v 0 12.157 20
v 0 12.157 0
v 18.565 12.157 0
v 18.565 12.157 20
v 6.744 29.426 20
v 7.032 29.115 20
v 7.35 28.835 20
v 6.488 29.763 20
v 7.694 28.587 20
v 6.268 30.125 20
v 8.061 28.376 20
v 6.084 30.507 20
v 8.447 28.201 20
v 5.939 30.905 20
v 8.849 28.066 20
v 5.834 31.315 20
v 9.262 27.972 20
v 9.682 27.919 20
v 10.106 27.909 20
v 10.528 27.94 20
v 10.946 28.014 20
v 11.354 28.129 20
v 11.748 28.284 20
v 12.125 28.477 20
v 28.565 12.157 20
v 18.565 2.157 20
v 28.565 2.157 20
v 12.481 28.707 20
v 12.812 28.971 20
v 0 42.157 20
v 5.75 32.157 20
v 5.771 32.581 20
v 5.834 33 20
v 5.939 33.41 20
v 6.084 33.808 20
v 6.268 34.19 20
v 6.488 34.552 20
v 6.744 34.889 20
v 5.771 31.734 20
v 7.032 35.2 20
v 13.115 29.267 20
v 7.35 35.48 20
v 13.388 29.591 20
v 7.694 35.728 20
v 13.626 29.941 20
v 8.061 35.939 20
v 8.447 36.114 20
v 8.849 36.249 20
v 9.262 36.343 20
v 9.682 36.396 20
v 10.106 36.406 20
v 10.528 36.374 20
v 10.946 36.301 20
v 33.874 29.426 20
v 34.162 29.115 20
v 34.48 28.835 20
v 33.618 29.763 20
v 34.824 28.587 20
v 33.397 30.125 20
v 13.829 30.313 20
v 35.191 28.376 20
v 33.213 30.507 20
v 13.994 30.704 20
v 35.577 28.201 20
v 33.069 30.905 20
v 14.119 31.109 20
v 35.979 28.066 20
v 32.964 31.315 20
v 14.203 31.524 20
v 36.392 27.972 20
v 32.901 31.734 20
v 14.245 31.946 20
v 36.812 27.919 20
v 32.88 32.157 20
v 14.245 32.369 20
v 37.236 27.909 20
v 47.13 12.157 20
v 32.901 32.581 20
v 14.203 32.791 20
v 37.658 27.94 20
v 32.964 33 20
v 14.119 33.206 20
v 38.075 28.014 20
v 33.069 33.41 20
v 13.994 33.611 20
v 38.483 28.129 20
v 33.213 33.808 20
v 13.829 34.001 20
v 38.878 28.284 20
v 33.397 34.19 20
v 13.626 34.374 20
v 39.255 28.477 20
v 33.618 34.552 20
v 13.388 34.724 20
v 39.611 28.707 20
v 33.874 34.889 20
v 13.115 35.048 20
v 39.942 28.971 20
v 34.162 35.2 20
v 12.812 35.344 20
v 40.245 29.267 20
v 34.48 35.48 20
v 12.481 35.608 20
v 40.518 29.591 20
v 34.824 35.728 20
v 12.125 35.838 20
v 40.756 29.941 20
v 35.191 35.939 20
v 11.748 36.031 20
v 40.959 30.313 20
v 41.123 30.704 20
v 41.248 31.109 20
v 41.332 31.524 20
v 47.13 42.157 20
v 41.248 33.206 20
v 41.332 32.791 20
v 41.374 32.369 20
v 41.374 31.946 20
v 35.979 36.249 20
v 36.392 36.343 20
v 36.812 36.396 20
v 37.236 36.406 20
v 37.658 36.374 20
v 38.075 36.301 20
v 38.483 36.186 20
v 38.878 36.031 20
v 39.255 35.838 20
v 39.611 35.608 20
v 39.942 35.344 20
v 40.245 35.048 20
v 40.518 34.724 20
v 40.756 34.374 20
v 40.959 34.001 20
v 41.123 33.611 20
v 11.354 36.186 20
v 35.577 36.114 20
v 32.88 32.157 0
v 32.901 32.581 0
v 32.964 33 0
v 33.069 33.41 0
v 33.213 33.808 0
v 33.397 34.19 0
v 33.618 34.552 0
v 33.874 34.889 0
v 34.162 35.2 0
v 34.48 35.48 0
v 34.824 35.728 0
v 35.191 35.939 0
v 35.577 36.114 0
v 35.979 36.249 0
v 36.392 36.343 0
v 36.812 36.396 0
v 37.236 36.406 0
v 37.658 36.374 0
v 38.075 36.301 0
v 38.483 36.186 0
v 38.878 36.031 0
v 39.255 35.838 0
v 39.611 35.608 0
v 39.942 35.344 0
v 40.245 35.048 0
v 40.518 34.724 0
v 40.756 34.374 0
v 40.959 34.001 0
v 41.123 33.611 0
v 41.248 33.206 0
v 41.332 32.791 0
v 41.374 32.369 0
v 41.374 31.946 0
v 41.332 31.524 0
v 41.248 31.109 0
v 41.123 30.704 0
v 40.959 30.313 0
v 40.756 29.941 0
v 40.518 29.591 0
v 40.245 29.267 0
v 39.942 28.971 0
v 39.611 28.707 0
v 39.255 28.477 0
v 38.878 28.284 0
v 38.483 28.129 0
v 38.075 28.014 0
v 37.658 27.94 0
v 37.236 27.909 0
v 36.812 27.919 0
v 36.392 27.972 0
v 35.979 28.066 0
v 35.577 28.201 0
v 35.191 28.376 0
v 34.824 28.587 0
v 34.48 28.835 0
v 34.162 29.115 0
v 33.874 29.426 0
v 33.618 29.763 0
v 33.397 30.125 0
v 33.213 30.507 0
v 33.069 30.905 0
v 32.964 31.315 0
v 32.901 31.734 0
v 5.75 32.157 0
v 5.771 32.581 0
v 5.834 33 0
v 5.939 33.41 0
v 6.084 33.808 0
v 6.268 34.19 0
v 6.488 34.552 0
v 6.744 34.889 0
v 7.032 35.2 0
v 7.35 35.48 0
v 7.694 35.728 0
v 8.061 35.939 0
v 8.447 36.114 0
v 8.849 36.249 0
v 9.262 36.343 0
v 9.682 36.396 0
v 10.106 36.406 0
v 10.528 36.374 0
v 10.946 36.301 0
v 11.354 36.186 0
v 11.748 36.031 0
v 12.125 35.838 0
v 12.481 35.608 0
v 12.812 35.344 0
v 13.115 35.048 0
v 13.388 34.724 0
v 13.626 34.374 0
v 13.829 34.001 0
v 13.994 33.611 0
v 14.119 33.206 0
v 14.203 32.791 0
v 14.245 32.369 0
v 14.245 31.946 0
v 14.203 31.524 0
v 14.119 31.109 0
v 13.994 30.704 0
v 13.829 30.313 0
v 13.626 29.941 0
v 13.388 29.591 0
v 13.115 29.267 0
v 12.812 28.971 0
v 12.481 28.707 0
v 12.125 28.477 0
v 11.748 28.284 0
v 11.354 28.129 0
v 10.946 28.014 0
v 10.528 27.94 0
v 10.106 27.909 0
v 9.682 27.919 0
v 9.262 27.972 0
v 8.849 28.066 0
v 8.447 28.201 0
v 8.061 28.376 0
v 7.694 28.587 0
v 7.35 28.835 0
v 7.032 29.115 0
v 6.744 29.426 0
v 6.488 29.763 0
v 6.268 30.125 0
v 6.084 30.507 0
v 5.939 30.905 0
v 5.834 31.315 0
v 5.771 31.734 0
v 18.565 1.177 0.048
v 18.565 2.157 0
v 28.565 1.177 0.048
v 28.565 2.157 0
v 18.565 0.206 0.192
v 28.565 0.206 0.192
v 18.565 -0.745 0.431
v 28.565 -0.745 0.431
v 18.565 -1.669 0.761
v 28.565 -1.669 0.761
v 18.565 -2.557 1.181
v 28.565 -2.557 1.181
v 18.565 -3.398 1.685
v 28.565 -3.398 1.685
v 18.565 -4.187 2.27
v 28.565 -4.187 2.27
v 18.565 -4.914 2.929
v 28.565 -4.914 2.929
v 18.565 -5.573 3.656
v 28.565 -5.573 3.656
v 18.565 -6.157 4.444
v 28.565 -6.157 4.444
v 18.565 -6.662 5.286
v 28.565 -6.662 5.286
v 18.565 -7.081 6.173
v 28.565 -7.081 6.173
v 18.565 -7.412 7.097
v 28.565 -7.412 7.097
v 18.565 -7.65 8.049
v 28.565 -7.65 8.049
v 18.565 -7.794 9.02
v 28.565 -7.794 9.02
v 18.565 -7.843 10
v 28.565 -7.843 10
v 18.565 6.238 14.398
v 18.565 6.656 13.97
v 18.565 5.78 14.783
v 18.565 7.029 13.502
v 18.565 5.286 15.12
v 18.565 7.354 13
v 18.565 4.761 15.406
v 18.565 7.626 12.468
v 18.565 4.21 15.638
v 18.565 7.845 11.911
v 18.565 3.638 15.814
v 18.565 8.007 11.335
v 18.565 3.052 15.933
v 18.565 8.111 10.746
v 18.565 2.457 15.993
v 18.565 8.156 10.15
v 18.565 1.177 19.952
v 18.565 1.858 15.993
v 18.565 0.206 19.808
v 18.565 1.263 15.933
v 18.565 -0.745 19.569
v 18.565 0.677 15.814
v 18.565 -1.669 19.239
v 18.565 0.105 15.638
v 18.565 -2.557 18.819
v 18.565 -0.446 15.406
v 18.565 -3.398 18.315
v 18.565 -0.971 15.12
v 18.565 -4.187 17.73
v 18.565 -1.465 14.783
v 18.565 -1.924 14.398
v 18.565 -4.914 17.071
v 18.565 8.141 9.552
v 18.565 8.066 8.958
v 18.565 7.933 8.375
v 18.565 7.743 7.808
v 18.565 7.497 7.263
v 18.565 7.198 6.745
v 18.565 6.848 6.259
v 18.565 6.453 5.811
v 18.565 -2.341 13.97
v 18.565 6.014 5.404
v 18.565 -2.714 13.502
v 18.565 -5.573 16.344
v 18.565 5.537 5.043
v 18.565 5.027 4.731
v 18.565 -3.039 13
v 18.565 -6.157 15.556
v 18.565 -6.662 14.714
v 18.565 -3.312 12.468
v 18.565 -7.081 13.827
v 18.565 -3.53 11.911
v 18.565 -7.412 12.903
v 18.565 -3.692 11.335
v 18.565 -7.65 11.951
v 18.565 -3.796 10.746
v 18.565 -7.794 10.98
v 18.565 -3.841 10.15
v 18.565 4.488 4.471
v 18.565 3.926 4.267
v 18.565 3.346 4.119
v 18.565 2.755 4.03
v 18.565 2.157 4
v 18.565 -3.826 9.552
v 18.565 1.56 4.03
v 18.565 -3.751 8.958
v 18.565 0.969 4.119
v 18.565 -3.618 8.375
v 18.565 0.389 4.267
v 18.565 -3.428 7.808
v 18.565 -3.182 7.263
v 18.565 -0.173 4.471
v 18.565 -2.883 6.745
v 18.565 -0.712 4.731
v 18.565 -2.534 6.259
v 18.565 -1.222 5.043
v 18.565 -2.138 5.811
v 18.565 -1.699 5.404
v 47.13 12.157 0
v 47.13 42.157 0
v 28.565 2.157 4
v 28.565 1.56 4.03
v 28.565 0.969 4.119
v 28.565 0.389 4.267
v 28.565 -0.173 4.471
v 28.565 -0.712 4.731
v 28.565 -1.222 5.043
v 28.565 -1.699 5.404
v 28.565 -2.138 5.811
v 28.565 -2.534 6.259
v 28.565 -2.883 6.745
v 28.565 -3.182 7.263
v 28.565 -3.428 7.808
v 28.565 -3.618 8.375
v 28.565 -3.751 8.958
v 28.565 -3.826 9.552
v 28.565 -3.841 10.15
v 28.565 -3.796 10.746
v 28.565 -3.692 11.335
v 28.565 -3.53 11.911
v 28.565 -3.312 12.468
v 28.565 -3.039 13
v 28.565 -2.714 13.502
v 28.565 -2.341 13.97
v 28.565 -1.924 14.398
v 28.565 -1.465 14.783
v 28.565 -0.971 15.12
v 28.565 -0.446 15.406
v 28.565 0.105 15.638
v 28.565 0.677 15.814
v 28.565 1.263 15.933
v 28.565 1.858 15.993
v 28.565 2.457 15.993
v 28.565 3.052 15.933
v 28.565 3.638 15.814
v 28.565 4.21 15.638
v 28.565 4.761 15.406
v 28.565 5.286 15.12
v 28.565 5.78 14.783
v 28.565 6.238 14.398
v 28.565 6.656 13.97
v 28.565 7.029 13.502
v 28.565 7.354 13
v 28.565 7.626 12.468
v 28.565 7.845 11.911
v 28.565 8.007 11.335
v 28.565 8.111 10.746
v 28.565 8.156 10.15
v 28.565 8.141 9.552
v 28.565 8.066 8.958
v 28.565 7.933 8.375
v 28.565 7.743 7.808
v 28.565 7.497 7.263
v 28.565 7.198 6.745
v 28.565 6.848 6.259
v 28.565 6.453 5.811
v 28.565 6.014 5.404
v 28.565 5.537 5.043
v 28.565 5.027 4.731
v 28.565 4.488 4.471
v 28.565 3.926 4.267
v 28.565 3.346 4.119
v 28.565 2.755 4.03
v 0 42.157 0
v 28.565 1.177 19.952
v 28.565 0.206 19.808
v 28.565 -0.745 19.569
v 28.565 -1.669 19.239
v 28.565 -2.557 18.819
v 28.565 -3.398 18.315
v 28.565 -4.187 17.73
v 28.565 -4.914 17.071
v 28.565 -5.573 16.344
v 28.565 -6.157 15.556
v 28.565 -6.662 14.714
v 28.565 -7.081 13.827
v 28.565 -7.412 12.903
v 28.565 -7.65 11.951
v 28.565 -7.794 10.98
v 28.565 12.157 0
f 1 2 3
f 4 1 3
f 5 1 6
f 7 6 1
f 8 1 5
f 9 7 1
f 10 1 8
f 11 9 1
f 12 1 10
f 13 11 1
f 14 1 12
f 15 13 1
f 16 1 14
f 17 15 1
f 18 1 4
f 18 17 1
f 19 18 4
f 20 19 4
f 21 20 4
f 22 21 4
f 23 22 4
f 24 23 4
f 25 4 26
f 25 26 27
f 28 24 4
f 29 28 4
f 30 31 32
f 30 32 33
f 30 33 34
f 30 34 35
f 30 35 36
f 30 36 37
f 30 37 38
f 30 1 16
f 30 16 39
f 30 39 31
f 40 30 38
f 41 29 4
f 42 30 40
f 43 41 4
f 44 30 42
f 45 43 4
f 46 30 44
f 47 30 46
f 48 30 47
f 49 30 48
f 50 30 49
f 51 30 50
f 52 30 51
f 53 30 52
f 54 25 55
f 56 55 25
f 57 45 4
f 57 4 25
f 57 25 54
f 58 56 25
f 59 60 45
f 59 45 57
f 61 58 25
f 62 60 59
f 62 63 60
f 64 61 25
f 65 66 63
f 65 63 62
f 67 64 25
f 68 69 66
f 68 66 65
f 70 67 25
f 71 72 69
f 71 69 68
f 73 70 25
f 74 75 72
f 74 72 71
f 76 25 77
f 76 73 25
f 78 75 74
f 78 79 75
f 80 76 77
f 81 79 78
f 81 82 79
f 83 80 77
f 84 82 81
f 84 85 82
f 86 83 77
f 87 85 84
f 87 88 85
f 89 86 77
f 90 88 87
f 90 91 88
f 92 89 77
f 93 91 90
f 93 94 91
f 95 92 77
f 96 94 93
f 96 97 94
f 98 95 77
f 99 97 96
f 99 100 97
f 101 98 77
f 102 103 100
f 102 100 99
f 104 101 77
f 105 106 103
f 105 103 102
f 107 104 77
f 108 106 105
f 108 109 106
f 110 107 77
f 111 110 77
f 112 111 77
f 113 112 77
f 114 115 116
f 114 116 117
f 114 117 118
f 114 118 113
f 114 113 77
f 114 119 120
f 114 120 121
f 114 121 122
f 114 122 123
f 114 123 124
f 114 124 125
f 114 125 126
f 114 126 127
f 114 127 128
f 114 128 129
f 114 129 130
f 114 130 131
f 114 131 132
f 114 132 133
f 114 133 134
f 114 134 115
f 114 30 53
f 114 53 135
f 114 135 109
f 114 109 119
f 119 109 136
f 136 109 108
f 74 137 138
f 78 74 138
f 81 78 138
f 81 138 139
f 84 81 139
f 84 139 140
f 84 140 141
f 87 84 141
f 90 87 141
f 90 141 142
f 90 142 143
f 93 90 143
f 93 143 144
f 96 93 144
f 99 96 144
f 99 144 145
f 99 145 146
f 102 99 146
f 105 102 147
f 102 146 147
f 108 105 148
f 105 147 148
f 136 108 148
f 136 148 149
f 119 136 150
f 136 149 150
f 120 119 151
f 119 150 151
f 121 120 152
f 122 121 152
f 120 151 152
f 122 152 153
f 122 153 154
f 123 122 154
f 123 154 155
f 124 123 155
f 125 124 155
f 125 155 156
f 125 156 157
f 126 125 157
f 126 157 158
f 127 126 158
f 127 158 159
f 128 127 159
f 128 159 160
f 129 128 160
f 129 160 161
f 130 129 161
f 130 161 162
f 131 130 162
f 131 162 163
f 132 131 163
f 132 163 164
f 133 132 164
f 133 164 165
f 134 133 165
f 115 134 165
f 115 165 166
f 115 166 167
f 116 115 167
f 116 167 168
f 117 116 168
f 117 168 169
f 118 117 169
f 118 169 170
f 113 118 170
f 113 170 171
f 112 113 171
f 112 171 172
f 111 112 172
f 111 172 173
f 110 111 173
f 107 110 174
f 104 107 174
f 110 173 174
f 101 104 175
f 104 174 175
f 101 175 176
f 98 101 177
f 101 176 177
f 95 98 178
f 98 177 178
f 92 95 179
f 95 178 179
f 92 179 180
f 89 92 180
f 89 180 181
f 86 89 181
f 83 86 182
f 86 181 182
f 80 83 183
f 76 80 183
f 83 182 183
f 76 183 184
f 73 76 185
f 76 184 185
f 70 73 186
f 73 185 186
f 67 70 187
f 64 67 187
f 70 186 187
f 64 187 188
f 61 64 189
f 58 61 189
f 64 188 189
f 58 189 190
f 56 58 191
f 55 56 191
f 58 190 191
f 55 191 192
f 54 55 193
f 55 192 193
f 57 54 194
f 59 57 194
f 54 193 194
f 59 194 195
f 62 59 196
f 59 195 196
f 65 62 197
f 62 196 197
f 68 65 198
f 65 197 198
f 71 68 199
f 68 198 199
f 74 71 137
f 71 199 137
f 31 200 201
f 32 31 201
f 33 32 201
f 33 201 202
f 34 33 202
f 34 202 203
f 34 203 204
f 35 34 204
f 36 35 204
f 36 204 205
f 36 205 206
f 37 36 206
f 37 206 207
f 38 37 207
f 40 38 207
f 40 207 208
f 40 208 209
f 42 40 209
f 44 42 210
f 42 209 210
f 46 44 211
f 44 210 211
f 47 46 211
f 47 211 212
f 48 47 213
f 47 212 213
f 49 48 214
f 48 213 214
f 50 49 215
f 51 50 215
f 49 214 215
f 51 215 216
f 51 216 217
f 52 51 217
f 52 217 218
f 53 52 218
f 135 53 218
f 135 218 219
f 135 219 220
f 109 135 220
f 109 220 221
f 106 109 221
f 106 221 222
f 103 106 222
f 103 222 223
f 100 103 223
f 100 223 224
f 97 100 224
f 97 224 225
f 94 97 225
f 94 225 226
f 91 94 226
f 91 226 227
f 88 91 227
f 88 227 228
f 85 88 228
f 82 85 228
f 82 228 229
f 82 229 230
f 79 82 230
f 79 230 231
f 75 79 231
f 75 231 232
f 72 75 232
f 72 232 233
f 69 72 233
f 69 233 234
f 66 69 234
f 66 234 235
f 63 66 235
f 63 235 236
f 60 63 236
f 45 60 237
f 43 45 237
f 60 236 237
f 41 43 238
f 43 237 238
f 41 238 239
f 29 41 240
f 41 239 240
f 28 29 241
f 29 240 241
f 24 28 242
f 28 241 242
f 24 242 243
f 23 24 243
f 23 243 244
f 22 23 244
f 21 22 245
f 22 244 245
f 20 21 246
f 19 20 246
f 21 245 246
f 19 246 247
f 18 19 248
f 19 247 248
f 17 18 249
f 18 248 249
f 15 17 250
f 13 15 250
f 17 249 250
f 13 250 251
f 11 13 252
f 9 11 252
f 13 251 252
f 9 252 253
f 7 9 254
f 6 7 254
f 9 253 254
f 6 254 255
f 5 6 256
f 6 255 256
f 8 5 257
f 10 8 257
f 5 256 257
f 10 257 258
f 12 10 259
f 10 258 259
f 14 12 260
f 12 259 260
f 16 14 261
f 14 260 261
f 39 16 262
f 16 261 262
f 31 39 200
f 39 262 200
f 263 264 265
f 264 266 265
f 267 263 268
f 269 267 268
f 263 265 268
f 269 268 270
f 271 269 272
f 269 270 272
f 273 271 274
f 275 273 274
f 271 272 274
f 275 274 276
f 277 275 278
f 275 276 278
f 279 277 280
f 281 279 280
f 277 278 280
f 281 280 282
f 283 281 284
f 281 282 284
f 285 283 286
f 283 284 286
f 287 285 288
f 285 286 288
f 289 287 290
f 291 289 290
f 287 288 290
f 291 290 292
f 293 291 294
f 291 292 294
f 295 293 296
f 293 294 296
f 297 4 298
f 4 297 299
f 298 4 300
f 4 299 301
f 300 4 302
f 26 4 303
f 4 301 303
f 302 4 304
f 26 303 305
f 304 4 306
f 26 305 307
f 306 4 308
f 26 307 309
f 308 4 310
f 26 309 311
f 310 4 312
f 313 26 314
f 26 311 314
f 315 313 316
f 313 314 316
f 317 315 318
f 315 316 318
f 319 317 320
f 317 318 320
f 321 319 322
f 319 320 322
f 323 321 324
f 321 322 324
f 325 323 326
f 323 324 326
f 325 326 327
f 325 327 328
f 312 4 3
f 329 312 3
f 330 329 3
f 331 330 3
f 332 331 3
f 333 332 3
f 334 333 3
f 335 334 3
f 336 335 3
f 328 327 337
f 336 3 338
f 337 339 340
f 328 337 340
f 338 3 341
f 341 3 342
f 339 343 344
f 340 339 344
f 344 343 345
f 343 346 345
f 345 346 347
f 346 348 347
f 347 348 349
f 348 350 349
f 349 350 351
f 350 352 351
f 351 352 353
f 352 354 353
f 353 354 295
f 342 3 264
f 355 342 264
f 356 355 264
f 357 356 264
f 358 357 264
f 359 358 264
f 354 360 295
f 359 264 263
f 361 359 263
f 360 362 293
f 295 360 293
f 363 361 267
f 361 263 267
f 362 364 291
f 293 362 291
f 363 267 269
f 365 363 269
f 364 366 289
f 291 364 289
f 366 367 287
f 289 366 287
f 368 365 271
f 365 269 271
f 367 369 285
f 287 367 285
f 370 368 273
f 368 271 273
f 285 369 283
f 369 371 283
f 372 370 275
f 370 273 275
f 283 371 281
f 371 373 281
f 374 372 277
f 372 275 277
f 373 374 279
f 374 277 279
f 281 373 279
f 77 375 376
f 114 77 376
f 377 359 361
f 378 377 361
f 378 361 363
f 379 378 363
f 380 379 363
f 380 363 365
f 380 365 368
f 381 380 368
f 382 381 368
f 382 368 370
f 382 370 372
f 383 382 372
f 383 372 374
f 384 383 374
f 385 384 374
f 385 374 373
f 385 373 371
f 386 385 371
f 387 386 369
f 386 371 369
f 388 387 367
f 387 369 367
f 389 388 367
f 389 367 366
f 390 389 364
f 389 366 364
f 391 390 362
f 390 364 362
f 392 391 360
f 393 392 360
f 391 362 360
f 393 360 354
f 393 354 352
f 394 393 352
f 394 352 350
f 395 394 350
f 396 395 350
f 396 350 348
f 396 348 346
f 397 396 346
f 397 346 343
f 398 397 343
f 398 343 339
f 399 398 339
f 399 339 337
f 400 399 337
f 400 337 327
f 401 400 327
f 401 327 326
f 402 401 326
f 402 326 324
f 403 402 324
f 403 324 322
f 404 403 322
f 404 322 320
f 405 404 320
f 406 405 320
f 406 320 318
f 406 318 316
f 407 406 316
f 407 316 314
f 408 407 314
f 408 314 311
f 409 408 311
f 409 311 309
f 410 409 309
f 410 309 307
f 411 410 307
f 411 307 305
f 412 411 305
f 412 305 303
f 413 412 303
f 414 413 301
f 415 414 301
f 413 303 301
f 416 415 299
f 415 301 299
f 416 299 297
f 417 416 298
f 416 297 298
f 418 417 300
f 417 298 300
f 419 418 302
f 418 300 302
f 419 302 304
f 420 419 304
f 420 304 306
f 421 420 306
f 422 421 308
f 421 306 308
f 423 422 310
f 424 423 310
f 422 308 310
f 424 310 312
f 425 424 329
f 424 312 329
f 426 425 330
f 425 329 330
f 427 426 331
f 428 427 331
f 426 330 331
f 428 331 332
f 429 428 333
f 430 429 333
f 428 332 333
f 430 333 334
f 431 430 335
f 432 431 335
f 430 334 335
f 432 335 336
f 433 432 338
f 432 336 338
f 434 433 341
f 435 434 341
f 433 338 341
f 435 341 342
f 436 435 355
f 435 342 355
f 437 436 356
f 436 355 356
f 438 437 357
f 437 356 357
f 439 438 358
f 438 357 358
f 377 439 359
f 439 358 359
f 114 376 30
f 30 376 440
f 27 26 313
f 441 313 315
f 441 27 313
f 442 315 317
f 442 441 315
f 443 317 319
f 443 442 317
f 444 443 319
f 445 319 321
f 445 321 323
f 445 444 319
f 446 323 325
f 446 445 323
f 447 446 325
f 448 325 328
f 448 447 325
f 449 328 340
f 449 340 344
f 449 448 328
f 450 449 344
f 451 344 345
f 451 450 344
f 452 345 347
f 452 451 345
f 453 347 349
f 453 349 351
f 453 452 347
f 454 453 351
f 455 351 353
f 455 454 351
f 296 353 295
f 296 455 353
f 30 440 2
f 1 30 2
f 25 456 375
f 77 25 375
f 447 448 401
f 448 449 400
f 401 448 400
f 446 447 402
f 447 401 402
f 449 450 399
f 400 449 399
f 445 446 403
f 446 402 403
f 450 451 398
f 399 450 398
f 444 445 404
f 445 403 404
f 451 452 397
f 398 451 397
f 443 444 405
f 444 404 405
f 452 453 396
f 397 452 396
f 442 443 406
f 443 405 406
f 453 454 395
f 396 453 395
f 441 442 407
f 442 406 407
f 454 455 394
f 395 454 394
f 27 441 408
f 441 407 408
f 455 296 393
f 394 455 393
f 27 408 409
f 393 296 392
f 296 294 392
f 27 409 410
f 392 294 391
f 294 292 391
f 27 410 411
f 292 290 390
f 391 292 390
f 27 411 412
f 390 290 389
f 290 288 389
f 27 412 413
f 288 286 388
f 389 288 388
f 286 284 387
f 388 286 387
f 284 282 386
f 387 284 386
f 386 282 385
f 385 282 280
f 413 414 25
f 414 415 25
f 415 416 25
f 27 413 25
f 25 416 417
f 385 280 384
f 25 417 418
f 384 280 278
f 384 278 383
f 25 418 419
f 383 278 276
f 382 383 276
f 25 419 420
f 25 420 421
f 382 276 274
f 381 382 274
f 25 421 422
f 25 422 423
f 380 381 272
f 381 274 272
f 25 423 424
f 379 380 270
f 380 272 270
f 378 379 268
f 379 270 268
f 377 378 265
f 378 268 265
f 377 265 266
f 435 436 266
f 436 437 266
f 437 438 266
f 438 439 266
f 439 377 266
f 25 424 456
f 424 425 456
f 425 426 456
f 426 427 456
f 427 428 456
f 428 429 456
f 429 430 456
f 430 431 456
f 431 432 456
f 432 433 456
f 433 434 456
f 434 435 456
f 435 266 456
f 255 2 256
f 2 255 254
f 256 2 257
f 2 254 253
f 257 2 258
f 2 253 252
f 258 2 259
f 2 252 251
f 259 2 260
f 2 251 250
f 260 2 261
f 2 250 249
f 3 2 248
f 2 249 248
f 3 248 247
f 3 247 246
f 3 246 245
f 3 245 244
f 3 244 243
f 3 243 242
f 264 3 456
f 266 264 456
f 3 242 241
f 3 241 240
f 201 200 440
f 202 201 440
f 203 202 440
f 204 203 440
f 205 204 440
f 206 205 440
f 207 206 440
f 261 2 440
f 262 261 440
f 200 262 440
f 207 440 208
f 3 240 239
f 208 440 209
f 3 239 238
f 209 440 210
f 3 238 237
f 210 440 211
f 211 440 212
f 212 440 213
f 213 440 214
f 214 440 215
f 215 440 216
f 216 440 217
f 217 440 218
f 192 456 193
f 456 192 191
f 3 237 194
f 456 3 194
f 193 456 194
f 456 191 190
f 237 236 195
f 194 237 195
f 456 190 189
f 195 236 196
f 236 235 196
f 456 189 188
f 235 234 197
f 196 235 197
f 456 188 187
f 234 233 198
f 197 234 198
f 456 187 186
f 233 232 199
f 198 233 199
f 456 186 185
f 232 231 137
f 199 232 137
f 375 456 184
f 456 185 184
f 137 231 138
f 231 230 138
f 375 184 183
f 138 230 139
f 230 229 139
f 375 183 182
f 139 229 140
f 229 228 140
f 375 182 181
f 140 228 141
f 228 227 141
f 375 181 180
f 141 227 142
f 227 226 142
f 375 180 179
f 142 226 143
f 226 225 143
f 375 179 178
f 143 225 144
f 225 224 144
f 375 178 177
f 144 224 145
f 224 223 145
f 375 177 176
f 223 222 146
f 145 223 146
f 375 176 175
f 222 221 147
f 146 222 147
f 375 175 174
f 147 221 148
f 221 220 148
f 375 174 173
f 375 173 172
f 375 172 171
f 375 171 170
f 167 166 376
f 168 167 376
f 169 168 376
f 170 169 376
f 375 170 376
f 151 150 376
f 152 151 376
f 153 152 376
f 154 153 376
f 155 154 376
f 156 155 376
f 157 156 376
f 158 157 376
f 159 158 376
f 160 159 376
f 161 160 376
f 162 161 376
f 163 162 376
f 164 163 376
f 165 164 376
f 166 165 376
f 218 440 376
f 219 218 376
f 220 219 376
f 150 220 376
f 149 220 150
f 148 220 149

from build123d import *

# Parameters (mm, degrees)
EXTRUDE1_DEPTH                 = 20
F_12_0_12_DIAMETER_HOLE1_D     = 12
F_12_0_12_DIAMETER_HOLE1_DEPTH = 47.13
F_12_0_12_DIAMETER_HOLE1_TIP   = 3.605163714
F_8_5_8_5_DIAMETER_HOLE2_D     = 8.5
FILLET1_R                      = 10


with BuildPart() as part:
    # Sketch1 → Extrude1 (new body)
    with BuildSketch(Plane.XY):
        Polygon((0, 12.157460585), (18.564852768, 12.157460585), (18.564852768, -7.842539415), (28.564852768, -7.842539415), (28.564852768, 12.157460585), (47.129705535, 12.157460585), (47.129705535, 42.157460585), (0, 42.157460585), align=None)
    extrude(amount=EXTRUDE1_DEPTH)

    # Ø12.0 (12) Diameter Hole1
    with Locations(Plane(origin=(47.129705535, 2.157460585, 10), x_dir=(0, 0, 1), z_dir=(1, 0, 0))):
        with Locations((0, 0)):
            Hole(F_12_0_12_DIAMETER_HOLE1_D / 2, depth=F_12_0_12_DIAMETER_HOLE1_DEPTH)
            with Locations((0, 0, -(F_12_0_12_DIAMETER_HOLE1_DEPTH + F_12_0_12_DIAMETER_HOLE1_TIP / 2))):  # 118° drill point
                Cone(0, F_12_0_12_DIAMETER_HOLE1_D / 2, F_12_0_12_DIAMETER_HOLE1_TIP, mode=Mode.SUBTRACT)

    # Ø8.5 (8.5) Diameter Hole2 (through all)
    with Locations(Plane(origin=(37.129705535, 32.157460585, 20), x_dir=(1, 0, 0), z_dir=(0, 0, 1))):
        with Locations((0, 0), (-27.129705535, 0)):
            Hole(F_8_5_8_5_DIAMETER_HOLE2_D / 2)

    # Fillet1
    fillet1_edges = [part.edges().sort_by_distance(p)[0] for p in [
        (23.564852768, -7.842539415, 20),
        (23.564852768, -7.842539415, 0),
    ]]
    fillet(fillet1_edges, radius=FILLET1_R - 0.0001)  # a hair under: the kernel refuses the full size


solid = part.part
